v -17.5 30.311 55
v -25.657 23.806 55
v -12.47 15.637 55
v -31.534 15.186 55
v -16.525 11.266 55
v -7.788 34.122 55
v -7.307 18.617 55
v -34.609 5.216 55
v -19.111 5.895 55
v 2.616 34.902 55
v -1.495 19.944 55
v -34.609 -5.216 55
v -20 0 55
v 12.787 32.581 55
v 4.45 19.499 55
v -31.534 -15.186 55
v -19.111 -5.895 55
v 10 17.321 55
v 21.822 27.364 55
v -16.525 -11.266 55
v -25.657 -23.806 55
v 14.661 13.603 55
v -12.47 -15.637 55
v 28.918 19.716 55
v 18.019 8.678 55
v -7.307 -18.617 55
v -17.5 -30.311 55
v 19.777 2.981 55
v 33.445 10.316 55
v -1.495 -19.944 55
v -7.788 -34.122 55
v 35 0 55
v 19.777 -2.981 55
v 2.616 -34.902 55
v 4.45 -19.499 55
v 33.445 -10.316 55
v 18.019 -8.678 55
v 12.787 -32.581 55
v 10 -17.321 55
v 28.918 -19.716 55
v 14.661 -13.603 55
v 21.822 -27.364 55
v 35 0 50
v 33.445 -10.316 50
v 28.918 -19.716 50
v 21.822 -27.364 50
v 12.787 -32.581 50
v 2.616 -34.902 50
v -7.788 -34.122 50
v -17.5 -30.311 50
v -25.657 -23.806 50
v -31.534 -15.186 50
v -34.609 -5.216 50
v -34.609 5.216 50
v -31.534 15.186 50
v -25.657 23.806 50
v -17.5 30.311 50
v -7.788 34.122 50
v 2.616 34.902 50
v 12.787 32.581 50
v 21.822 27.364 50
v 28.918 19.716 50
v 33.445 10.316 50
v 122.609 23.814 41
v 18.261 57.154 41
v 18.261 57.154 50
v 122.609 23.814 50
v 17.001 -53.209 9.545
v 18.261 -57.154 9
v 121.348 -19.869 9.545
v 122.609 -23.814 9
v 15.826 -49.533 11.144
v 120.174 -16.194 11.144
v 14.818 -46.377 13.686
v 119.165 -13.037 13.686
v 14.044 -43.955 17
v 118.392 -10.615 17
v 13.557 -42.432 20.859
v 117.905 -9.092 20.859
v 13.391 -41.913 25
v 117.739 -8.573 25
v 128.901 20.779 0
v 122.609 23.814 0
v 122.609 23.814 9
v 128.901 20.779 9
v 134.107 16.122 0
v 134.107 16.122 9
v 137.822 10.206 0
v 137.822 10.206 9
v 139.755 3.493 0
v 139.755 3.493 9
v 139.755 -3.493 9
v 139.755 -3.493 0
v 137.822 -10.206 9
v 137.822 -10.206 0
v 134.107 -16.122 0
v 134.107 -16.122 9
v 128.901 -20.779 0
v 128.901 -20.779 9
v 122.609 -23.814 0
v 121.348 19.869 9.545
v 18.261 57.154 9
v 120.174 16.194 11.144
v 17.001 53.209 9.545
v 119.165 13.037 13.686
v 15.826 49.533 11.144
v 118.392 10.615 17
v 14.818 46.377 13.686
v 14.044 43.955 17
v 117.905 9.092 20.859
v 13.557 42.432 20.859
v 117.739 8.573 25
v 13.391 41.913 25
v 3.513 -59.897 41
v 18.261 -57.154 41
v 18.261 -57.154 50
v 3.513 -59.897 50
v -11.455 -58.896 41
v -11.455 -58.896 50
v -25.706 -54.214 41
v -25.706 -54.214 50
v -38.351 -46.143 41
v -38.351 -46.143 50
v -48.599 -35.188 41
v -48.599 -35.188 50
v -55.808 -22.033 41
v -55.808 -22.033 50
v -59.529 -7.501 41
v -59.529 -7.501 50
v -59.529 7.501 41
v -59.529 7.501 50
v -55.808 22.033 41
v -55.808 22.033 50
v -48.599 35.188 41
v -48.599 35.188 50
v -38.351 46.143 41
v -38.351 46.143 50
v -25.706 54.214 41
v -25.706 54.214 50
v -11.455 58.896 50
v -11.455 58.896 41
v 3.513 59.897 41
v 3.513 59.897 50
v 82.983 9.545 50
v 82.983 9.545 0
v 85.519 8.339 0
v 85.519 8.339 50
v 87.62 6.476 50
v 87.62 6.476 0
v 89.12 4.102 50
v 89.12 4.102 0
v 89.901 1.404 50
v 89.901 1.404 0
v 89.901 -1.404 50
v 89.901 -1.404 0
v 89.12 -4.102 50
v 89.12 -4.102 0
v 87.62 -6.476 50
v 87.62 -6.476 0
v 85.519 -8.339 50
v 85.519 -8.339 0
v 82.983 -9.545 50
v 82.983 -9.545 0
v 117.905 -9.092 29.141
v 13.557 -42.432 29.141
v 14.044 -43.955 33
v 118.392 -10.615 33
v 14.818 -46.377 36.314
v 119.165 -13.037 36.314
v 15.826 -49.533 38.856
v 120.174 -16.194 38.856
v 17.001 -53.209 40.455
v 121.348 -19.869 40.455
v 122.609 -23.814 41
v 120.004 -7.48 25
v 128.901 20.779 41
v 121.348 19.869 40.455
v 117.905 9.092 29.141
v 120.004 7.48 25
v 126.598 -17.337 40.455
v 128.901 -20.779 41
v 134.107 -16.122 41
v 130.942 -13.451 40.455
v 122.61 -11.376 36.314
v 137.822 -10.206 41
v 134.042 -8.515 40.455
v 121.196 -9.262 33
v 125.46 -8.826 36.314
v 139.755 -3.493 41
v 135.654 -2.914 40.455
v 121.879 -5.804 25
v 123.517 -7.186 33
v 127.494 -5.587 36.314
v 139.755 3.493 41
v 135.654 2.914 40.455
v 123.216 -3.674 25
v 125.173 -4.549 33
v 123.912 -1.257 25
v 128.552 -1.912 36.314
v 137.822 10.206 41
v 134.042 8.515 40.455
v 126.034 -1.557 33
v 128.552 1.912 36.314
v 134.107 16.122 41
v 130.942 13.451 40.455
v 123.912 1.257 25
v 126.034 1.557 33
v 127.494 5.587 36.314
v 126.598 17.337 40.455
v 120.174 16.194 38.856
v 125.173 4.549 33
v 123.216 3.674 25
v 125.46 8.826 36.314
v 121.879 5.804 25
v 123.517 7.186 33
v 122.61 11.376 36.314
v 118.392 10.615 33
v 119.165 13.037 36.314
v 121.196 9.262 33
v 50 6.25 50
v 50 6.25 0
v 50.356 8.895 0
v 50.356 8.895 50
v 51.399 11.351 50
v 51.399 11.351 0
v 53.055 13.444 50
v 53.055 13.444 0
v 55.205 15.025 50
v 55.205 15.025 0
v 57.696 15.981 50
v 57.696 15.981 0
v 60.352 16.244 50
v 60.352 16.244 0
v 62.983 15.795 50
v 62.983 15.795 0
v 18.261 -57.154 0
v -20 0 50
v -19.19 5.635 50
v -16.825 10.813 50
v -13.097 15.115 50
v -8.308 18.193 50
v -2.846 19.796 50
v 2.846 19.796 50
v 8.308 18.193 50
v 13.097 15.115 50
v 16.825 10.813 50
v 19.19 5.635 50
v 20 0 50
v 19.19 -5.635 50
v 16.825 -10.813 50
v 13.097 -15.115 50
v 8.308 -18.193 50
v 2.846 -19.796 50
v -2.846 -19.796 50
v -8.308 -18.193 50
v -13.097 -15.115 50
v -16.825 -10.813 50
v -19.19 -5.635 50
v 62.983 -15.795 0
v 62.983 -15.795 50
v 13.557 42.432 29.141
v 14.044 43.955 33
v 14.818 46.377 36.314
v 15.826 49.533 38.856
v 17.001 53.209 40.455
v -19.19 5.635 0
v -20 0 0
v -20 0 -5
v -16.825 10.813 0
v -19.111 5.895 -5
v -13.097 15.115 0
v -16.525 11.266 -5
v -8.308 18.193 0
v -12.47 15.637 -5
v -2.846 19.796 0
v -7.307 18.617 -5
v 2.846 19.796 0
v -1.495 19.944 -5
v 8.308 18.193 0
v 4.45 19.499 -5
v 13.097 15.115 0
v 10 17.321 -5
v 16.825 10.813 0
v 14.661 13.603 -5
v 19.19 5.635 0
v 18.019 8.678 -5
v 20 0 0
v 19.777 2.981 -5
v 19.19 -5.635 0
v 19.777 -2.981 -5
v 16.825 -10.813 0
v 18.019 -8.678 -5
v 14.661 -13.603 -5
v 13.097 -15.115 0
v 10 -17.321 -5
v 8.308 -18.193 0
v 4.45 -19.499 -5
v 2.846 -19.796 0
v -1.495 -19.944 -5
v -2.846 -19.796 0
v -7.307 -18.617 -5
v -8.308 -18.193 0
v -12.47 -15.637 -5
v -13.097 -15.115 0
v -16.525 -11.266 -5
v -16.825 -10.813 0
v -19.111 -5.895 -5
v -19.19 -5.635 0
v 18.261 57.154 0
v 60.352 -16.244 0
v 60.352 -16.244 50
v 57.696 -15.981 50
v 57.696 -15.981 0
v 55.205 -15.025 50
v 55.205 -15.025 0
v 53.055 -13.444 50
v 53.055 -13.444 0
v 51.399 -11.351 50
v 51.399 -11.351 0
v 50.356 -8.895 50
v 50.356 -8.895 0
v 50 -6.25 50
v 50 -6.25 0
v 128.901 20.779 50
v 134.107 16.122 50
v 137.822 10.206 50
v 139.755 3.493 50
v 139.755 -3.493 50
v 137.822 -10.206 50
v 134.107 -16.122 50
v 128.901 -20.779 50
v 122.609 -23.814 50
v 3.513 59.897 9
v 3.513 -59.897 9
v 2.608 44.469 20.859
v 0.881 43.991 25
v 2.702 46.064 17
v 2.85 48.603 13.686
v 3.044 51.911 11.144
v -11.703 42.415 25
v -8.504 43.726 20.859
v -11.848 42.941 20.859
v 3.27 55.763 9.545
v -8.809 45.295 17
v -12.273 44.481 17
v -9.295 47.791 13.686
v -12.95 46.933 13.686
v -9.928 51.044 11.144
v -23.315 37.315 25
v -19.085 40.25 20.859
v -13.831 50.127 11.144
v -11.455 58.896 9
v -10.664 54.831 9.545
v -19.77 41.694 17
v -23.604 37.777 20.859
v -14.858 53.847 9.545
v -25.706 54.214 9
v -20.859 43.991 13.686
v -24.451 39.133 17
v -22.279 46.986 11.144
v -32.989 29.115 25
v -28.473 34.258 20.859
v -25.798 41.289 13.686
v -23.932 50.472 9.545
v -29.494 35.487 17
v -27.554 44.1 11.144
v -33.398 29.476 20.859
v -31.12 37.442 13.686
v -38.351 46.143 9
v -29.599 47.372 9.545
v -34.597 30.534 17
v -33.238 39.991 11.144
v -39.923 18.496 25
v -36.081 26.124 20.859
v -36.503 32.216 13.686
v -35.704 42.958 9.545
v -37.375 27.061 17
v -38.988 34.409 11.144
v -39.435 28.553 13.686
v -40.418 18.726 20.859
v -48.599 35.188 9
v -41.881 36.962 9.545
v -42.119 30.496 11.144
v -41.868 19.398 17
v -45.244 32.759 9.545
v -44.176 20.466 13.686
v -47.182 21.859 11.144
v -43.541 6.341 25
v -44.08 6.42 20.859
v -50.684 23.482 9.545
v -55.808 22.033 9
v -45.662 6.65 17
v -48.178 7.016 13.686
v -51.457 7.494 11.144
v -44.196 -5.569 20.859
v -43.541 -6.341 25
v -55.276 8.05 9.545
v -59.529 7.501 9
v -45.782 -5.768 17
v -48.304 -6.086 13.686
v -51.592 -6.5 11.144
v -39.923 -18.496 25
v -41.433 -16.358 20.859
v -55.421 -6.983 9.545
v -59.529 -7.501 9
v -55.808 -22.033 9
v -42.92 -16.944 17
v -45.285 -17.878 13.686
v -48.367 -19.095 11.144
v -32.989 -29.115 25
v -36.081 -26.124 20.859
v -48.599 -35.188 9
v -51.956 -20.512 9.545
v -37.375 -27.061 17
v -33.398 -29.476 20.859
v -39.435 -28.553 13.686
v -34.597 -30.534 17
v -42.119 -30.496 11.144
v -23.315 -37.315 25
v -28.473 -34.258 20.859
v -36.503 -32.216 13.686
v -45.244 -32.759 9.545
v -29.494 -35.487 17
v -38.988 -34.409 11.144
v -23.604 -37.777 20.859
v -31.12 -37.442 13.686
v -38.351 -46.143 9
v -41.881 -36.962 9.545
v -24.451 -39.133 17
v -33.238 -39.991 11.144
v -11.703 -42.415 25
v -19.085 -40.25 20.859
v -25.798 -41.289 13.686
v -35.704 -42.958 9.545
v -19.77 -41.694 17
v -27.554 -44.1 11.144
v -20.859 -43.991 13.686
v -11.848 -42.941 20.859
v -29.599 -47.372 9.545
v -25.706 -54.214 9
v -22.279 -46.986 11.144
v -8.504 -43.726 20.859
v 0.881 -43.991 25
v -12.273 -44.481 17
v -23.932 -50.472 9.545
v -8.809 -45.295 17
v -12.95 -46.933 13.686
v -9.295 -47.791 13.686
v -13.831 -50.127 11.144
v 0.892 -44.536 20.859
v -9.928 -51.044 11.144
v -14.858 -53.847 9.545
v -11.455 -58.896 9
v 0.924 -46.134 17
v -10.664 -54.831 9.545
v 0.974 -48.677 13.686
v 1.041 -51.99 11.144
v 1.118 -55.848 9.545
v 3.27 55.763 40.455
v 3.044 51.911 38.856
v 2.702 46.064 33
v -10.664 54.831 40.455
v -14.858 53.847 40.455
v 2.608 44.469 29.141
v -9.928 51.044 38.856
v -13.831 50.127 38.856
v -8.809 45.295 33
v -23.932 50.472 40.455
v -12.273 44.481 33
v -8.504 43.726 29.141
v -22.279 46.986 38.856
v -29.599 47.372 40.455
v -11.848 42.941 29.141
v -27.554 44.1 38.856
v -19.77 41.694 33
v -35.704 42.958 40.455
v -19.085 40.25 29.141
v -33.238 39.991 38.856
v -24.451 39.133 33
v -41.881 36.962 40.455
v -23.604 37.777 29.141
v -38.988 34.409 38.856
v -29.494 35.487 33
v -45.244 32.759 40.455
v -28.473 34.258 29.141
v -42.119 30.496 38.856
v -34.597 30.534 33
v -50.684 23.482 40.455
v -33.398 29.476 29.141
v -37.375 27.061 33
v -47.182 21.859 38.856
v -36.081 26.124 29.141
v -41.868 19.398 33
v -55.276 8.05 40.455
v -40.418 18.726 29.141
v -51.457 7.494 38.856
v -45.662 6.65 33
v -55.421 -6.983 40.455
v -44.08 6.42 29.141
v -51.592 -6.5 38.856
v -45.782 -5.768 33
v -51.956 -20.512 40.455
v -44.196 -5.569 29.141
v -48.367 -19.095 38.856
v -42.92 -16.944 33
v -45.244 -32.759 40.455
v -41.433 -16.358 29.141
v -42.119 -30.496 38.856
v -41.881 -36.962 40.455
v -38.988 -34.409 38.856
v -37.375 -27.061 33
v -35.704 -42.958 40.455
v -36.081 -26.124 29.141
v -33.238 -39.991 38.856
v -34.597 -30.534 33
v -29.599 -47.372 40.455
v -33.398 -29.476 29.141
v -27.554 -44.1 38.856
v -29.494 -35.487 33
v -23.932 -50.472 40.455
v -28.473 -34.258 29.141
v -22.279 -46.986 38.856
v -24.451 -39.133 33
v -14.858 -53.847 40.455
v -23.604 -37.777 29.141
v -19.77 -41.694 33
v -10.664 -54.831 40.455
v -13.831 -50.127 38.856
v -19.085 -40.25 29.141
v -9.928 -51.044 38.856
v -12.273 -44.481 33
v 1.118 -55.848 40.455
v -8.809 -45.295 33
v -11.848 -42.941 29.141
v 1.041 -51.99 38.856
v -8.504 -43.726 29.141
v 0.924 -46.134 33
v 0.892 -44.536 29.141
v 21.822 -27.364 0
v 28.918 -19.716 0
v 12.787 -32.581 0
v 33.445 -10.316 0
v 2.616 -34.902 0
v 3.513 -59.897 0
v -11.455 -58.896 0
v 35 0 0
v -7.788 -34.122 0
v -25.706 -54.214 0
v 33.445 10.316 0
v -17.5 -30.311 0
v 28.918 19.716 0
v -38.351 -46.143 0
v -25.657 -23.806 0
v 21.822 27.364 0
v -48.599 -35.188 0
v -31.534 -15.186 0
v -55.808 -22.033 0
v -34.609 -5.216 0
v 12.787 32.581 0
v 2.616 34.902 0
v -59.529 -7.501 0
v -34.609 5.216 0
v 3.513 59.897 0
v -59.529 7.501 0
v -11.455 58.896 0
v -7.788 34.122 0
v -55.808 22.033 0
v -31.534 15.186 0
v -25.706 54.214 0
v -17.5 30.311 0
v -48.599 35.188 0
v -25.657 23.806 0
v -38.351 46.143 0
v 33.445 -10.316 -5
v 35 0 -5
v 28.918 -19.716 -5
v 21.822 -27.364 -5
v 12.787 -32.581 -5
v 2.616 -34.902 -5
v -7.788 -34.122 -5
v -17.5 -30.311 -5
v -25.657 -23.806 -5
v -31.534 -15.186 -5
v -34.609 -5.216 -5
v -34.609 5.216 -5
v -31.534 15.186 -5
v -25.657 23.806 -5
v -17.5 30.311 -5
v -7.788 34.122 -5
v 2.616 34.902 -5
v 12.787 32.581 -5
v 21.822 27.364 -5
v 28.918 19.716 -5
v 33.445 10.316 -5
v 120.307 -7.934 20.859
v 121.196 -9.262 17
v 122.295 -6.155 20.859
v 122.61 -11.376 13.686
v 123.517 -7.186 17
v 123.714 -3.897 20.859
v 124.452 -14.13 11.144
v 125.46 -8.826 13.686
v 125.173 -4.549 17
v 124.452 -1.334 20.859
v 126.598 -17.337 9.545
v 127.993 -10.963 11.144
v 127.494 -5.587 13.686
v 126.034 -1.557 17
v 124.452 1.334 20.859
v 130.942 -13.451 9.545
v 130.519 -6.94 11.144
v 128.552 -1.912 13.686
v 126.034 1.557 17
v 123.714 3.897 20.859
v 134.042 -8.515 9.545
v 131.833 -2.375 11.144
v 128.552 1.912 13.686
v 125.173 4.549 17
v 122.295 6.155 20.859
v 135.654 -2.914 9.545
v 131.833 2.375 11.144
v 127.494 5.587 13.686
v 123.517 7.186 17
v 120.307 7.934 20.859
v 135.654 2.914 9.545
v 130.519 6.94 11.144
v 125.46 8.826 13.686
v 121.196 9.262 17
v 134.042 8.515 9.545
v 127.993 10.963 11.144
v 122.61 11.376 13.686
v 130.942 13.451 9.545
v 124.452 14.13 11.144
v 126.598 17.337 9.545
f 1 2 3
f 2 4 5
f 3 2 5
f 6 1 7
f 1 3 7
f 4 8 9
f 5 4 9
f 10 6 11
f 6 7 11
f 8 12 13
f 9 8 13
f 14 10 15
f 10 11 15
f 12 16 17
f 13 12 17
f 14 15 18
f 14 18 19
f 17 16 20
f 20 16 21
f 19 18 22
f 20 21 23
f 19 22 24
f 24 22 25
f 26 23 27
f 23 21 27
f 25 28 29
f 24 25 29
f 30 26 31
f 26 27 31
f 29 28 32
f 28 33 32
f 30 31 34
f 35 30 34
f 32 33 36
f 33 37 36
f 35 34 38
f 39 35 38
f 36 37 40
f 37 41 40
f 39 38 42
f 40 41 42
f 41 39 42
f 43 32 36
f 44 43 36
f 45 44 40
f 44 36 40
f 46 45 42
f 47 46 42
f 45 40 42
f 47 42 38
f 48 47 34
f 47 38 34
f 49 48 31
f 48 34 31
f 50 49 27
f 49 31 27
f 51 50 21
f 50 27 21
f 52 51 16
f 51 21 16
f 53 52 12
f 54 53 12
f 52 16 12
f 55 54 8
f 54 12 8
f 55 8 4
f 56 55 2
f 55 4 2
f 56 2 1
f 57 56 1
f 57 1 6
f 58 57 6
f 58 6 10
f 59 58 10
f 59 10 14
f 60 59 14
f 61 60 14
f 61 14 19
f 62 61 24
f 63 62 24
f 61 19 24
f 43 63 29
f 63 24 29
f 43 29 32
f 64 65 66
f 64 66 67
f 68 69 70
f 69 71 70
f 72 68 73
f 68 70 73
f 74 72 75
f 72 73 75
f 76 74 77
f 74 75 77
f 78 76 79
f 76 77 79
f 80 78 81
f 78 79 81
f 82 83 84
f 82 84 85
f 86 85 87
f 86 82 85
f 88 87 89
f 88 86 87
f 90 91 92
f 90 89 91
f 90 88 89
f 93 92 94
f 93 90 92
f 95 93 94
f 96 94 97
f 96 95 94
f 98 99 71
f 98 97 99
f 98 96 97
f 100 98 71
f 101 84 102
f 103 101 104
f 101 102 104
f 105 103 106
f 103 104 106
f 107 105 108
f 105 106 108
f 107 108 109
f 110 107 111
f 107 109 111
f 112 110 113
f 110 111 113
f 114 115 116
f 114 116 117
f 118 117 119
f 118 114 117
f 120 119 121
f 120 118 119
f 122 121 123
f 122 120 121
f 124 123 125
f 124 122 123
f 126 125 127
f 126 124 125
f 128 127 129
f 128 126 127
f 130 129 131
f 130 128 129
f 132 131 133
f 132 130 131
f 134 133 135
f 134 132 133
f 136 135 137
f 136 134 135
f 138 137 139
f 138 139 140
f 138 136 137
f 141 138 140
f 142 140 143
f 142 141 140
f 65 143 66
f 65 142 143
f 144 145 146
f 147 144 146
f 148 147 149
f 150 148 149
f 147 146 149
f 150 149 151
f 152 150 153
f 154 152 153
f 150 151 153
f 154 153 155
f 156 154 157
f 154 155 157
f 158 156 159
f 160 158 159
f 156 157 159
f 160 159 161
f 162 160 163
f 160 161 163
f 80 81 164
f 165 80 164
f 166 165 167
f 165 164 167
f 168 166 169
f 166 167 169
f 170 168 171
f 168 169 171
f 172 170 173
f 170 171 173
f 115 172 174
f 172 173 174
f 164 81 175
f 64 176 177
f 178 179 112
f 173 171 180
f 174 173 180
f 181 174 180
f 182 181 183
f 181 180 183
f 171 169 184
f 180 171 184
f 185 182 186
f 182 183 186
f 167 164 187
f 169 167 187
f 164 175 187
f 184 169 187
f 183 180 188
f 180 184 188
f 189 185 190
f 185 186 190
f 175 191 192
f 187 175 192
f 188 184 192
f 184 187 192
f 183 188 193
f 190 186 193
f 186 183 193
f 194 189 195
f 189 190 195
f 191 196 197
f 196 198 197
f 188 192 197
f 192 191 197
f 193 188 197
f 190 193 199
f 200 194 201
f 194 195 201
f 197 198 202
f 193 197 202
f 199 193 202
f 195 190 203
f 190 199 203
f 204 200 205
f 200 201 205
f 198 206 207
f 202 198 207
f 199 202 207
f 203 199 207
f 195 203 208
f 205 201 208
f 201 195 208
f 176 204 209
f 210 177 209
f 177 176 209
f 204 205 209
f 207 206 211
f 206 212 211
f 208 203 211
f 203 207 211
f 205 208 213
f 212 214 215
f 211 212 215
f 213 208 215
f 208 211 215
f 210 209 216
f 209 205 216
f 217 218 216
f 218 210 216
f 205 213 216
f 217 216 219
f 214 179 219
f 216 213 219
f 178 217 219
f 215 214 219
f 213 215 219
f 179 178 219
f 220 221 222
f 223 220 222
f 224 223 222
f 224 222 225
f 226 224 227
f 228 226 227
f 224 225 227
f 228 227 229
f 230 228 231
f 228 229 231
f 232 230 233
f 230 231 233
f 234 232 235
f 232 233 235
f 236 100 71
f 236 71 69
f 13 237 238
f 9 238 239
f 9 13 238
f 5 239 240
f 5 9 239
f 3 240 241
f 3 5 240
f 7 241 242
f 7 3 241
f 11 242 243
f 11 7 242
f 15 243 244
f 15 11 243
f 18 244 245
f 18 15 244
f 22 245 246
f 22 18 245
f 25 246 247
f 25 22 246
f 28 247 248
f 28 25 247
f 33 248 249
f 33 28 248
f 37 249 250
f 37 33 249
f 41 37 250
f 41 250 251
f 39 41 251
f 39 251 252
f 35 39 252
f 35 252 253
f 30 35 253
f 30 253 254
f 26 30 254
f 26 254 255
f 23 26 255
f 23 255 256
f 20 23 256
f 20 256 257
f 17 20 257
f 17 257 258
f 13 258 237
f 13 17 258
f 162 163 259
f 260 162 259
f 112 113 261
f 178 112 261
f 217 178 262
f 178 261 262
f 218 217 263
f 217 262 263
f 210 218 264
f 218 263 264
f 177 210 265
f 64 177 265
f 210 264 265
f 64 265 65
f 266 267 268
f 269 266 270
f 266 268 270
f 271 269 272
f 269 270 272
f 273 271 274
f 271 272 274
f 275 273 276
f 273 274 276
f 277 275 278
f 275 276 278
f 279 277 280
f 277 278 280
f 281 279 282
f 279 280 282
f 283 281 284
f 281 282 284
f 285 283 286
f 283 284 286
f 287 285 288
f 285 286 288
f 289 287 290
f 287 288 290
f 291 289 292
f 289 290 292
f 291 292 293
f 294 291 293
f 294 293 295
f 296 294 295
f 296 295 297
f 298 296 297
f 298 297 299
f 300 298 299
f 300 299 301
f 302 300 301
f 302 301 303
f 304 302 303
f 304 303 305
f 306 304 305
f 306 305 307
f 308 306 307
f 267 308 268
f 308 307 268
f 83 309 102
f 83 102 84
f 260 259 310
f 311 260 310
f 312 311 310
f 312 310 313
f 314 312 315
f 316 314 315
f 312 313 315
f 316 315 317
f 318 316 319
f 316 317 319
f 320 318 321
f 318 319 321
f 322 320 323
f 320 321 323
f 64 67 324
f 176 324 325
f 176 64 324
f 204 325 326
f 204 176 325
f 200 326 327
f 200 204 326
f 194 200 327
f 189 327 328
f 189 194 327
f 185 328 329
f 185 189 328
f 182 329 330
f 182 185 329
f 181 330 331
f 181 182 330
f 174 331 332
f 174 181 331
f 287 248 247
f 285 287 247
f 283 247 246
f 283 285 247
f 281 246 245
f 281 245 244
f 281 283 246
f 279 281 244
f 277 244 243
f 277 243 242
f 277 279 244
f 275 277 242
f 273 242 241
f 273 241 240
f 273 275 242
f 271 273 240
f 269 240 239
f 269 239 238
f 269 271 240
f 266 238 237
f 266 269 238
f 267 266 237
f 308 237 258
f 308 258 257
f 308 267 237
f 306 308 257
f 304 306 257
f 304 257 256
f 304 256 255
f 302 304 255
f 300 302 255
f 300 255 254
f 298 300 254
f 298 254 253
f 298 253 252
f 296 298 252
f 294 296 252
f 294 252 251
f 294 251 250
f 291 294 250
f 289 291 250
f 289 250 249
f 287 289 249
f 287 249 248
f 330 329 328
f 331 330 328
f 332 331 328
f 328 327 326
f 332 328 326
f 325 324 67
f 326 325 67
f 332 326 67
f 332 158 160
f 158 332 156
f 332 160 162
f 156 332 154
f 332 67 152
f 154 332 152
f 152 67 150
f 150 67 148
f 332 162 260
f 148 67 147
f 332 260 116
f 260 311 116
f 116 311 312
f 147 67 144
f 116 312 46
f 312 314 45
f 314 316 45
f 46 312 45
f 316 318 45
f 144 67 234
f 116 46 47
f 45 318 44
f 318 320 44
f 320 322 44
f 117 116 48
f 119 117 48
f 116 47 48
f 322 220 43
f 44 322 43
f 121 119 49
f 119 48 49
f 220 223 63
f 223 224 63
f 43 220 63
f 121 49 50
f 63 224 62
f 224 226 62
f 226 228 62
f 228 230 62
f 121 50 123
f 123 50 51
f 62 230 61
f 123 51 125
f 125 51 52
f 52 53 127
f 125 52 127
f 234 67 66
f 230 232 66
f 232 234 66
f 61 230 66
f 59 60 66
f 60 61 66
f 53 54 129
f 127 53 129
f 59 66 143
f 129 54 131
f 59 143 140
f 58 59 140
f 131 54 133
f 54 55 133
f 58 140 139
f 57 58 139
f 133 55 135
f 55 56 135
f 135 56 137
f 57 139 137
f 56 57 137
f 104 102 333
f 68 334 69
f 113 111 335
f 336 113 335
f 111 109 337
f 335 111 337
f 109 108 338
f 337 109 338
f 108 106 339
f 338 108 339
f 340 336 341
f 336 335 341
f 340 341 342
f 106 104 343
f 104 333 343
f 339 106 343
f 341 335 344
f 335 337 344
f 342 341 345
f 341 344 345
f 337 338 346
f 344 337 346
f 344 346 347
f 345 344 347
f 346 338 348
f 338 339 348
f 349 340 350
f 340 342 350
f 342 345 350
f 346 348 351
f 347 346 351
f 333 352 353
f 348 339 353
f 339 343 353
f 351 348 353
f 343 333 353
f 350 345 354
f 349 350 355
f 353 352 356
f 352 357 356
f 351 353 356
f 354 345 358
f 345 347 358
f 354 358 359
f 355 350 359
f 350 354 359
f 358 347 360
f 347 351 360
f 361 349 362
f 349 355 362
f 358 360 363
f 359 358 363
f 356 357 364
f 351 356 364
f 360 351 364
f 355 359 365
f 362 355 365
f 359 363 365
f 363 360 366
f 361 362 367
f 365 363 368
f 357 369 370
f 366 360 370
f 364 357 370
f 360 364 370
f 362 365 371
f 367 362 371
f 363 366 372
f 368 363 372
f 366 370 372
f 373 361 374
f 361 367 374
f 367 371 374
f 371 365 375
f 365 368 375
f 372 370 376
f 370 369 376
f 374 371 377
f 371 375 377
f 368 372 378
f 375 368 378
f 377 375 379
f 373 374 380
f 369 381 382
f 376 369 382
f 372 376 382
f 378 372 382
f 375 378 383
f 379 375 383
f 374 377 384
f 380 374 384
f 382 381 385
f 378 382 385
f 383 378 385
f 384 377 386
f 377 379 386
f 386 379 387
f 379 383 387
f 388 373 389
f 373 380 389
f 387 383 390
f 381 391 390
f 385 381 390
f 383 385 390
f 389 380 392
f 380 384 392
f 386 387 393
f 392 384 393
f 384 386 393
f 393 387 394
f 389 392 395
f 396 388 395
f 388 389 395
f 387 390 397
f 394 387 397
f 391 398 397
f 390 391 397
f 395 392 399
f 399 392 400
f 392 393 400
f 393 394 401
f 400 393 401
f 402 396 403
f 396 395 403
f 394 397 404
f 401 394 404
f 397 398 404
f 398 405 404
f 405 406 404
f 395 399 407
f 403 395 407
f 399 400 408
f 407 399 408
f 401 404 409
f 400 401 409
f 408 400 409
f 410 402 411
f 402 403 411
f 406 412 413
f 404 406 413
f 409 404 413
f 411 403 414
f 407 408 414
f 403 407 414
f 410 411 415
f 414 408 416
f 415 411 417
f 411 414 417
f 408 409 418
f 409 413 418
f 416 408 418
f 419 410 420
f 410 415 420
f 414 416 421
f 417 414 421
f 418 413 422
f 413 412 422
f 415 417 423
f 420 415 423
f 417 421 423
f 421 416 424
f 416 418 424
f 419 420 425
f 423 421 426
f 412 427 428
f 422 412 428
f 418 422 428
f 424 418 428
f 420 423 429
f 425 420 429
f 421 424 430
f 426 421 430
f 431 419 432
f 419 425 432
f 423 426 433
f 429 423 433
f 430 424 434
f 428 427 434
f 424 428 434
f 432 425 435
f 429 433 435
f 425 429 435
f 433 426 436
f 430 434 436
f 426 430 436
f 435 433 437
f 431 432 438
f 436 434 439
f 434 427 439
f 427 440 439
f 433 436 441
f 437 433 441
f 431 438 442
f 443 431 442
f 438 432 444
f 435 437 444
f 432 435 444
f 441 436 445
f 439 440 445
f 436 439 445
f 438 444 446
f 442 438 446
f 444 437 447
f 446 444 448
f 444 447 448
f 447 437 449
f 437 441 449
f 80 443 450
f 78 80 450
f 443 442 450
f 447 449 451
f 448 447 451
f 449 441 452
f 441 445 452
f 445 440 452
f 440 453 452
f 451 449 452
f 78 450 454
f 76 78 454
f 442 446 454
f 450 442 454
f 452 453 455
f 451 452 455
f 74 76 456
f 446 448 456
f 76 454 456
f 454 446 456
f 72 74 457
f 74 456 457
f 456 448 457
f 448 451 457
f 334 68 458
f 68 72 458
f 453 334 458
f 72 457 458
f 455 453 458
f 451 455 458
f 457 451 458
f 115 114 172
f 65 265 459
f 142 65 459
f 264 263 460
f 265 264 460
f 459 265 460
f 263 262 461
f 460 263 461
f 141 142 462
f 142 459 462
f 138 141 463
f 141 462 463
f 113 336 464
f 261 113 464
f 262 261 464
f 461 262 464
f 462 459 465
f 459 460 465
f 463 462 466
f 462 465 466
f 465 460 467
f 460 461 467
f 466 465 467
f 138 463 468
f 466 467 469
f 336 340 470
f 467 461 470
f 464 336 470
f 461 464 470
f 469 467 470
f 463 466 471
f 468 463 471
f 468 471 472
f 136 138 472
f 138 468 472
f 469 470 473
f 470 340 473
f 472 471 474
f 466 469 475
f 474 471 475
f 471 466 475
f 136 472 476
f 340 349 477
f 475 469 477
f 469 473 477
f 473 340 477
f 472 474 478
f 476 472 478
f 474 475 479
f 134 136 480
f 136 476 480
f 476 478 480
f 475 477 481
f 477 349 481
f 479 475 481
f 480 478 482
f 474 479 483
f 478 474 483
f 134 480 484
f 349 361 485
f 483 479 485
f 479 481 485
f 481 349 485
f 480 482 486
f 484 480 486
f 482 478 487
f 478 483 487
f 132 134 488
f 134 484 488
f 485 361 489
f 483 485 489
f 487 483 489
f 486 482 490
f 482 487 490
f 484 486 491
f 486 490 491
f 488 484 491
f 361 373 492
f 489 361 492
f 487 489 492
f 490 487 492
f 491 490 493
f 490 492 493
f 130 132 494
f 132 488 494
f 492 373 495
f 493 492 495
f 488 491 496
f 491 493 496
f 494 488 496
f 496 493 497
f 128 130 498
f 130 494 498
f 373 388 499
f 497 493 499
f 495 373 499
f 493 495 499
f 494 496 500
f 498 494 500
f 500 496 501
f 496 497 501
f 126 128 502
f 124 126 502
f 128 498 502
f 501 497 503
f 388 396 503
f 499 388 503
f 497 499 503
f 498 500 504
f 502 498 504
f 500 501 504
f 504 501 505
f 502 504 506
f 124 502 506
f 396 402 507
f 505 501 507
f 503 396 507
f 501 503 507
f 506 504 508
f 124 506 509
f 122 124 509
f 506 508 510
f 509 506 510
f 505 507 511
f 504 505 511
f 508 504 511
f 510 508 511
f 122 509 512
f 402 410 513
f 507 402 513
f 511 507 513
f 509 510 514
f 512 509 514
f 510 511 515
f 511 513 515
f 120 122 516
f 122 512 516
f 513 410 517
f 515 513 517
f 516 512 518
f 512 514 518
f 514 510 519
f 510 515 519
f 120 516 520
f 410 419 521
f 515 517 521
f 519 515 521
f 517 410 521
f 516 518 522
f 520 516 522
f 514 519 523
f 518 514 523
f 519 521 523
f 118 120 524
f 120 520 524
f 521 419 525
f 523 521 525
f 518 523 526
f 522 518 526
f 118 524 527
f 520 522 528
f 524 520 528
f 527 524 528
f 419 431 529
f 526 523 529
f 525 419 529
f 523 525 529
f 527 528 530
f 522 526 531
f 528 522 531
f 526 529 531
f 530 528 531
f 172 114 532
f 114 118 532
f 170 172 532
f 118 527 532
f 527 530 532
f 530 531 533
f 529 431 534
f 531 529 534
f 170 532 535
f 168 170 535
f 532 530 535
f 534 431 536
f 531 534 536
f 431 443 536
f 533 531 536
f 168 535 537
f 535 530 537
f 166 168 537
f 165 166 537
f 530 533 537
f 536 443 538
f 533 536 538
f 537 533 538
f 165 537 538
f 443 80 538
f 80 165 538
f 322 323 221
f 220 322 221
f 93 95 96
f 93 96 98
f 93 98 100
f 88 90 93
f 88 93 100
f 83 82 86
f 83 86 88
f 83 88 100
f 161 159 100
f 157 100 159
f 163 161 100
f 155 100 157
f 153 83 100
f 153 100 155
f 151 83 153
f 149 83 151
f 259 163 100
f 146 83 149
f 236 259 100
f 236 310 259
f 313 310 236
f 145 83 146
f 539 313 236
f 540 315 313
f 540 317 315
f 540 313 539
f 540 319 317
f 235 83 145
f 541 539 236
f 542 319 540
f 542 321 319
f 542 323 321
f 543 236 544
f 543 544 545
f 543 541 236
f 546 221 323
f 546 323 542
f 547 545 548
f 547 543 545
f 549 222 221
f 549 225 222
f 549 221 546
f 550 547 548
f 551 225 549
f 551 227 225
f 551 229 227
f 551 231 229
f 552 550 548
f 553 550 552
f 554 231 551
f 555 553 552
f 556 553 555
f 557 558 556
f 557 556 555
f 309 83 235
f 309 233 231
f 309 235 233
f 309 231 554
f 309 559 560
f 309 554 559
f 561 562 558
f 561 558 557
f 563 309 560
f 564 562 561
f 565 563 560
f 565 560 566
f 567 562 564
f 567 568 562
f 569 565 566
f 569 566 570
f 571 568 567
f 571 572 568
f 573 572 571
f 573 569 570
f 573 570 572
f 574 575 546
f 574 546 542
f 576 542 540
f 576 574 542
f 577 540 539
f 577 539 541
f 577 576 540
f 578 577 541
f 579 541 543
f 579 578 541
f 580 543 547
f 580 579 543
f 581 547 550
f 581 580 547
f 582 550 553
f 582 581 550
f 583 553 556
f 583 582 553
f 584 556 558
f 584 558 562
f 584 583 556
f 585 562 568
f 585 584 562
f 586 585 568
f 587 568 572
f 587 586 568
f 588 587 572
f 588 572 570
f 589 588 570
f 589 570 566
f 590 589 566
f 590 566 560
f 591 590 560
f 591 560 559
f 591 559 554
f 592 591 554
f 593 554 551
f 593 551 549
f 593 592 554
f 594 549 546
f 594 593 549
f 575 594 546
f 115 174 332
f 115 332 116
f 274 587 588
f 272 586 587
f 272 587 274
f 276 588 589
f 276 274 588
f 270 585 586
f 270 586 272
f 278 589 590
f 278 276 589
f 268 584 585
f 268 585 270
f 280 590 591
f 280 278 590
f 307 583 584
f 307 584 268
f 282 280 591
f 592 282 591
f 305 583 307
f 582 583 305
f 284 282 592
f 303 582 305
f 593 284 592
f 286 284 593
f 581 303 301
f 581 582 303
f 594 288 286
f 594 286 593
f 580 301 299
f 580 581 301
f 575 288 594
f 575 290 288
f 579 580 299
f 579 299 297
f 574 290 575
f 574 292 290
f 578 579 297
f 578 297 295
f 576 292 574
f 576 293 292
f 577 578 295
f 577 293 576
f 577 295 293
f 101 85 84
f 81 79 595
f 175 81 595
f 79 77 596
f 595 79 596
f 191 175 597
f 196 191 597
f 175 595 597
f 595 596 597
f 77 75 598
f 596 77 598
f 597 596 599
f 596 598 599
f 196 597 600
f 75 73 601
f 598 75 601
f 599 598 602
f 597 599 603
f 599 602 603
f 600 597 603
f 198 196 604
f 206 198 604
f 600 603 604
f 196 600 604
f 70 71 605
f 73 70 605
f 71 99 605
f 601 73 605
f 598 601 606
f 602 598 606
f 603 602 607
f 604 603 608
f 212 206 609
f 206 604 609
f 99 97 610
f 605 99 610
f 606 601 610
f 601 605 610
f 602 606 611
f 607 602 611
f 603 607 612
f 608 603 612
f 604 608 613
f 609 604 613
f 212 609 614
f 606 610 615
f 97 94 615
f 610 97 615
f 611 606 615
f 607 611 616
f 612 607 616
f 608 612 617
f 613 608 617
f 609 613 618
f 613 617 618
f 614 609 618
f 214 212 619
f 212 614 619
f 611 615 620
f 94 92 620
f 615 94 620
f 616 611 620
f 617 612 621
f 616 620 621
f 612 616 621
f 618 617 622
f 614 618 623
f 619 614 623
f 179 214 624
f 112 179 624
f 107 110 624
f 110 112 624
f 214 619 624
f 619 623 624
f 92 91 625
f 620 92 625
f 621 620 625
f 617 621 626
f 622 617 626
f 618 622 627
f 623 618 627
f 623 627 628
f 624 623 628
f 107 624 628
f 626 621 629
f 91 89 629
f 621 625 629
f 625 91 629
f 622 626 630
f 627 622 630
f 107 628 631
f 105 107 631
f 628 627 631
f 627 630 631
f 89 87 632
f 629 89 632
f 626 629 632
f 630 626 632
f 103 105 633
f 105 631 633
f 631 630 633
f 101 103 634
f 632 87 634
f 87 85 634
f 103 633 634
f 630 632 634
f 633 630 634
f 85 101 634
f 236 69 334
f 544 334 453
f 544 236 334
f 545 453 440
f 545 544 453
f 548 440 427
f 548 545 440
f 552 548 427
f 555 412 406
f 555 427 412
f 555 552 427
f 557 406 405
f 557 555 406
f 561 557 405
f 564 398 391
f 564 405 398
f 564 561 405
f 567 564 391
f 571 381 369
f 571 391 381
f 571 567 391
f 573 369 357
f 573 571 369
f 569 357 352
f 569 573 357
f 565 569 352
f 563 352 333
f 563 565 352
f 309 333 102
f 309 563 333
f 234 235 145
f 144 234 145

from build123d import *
from build123d.topology import SkipClean

# Parameters (mm, degrees)
SKETCH_1_R      = 20
EXTRUDE_1_DEPTH = 50
EXTRUDE_START   = 5
SKETCH_2_R      = 35
SKETCH_2_R_2    = 20
EXTRUDE_2_DEPTH = 5
SKETCH_3_R      = 16


with BuildPart() as part:
    # 草图1 → 凸台-拉伸1 (new body)
    with BuildSketch(Plane.XY):
        with BuildLine():
            Line((18.260869565, 57.153658174), (122.608695652, 23.814024239))
            ThreePointArc((122.608695652, 23.814024239), (140, 0), (122.608695652, -23.814024239))
            Line((122.608695652, -23.814024239), (18.260869565, -57.153658174))
            ThreePointArc((18.260869565, -57.153658174), (-60, 0), (18.260869565, 57.153658174))
        make_face()
        Circle(SKETCH_1_R, mode=Mode.SUBTRACT)
        with BuildLine():
            Line((50, -6.25), (50, 6.25))
            ThreePointArc((50, 6.25), (54.076635218, 14.306906953), (62.982749931, 15.79479978))
            Line((62.982749931, 15.79479978), (82.982749931, 9.54479978))
            ThreePointArc((82.982749931, 9.54479978), (90, 0), (82.982749931, -9.54479978))
            Line((82.982749931, -9.54479978), (62.982749931, -15.79479978))
            ThreePointArc((62.982749931, -15.79479978), (54.076635218, -14.306906953), (50, -6.25))
        make_face(mode=Mode.SUBTRACT)
    extrude(amount=EXTRUDE_1_DEPTH)

    # 草图2 → 凸台-拉伸2 (add)
    with SkipClean():  # the faces are left unmerged after this step: merging them gives an invalid solid
        with BuildSketch(Plane(origin=(0, 0, 0), x_dir=(-1, 0, 0), z_dir=(0, 0, -1)).offset(EXTRUDE_START)):
            with Locations(Location((0, 0, 0), (0, 0, 180))):
                Circle(SKETCH_2_R)
            Circle(SKETCH_2_R_2, mode=Mode.SUBTRACT)
        extrude_2 = extrude(amount=-EXTRUDE_2_DEPTH)

    # 镜向1: 凸台-拉伸2 across plane
    add(extrude_2.mirror(Plane(origin=(0, 0, 25), x_dir=(1, 0, 0), z_dir=(0, 0, -1))))

    # 切除-扫描1: sweep along a path in 草图6
    with BuildLine(Plane(origin=(0, 0, 25), x_dir=(-1, 0, 0), z_dir=(0, 0, -1))) as sweep_1_path:
        Line((-122.608695652, 23.814024239), (-18.260869565, 57.153658174))
        ThreePointArc((-18.260869565, 57.153658174), (60, 0), (-18.260869565, -57.153658174))
        Line((-18.260869565, -57.153658174), (-122.608695652, -23.814024239))
        ThreePointArc((-122.608695652, -23.814024239), (-140, 0), (-122.608695652, 23.814024239))
    # 草图3 → 切除-扫描1 (sweep, cut)
    with BuildSketch(Plane(origin=(0, 0, 0), x_dir=(-1, 0, 0), z_dir=(0, -1, 0))):
        with Locations((-140, -25)):
            Circle(SKETCH_3_R)
    sweep(path=sweep_1_path.line, mode=Mode.SUBTRACT)


solid = part.part
